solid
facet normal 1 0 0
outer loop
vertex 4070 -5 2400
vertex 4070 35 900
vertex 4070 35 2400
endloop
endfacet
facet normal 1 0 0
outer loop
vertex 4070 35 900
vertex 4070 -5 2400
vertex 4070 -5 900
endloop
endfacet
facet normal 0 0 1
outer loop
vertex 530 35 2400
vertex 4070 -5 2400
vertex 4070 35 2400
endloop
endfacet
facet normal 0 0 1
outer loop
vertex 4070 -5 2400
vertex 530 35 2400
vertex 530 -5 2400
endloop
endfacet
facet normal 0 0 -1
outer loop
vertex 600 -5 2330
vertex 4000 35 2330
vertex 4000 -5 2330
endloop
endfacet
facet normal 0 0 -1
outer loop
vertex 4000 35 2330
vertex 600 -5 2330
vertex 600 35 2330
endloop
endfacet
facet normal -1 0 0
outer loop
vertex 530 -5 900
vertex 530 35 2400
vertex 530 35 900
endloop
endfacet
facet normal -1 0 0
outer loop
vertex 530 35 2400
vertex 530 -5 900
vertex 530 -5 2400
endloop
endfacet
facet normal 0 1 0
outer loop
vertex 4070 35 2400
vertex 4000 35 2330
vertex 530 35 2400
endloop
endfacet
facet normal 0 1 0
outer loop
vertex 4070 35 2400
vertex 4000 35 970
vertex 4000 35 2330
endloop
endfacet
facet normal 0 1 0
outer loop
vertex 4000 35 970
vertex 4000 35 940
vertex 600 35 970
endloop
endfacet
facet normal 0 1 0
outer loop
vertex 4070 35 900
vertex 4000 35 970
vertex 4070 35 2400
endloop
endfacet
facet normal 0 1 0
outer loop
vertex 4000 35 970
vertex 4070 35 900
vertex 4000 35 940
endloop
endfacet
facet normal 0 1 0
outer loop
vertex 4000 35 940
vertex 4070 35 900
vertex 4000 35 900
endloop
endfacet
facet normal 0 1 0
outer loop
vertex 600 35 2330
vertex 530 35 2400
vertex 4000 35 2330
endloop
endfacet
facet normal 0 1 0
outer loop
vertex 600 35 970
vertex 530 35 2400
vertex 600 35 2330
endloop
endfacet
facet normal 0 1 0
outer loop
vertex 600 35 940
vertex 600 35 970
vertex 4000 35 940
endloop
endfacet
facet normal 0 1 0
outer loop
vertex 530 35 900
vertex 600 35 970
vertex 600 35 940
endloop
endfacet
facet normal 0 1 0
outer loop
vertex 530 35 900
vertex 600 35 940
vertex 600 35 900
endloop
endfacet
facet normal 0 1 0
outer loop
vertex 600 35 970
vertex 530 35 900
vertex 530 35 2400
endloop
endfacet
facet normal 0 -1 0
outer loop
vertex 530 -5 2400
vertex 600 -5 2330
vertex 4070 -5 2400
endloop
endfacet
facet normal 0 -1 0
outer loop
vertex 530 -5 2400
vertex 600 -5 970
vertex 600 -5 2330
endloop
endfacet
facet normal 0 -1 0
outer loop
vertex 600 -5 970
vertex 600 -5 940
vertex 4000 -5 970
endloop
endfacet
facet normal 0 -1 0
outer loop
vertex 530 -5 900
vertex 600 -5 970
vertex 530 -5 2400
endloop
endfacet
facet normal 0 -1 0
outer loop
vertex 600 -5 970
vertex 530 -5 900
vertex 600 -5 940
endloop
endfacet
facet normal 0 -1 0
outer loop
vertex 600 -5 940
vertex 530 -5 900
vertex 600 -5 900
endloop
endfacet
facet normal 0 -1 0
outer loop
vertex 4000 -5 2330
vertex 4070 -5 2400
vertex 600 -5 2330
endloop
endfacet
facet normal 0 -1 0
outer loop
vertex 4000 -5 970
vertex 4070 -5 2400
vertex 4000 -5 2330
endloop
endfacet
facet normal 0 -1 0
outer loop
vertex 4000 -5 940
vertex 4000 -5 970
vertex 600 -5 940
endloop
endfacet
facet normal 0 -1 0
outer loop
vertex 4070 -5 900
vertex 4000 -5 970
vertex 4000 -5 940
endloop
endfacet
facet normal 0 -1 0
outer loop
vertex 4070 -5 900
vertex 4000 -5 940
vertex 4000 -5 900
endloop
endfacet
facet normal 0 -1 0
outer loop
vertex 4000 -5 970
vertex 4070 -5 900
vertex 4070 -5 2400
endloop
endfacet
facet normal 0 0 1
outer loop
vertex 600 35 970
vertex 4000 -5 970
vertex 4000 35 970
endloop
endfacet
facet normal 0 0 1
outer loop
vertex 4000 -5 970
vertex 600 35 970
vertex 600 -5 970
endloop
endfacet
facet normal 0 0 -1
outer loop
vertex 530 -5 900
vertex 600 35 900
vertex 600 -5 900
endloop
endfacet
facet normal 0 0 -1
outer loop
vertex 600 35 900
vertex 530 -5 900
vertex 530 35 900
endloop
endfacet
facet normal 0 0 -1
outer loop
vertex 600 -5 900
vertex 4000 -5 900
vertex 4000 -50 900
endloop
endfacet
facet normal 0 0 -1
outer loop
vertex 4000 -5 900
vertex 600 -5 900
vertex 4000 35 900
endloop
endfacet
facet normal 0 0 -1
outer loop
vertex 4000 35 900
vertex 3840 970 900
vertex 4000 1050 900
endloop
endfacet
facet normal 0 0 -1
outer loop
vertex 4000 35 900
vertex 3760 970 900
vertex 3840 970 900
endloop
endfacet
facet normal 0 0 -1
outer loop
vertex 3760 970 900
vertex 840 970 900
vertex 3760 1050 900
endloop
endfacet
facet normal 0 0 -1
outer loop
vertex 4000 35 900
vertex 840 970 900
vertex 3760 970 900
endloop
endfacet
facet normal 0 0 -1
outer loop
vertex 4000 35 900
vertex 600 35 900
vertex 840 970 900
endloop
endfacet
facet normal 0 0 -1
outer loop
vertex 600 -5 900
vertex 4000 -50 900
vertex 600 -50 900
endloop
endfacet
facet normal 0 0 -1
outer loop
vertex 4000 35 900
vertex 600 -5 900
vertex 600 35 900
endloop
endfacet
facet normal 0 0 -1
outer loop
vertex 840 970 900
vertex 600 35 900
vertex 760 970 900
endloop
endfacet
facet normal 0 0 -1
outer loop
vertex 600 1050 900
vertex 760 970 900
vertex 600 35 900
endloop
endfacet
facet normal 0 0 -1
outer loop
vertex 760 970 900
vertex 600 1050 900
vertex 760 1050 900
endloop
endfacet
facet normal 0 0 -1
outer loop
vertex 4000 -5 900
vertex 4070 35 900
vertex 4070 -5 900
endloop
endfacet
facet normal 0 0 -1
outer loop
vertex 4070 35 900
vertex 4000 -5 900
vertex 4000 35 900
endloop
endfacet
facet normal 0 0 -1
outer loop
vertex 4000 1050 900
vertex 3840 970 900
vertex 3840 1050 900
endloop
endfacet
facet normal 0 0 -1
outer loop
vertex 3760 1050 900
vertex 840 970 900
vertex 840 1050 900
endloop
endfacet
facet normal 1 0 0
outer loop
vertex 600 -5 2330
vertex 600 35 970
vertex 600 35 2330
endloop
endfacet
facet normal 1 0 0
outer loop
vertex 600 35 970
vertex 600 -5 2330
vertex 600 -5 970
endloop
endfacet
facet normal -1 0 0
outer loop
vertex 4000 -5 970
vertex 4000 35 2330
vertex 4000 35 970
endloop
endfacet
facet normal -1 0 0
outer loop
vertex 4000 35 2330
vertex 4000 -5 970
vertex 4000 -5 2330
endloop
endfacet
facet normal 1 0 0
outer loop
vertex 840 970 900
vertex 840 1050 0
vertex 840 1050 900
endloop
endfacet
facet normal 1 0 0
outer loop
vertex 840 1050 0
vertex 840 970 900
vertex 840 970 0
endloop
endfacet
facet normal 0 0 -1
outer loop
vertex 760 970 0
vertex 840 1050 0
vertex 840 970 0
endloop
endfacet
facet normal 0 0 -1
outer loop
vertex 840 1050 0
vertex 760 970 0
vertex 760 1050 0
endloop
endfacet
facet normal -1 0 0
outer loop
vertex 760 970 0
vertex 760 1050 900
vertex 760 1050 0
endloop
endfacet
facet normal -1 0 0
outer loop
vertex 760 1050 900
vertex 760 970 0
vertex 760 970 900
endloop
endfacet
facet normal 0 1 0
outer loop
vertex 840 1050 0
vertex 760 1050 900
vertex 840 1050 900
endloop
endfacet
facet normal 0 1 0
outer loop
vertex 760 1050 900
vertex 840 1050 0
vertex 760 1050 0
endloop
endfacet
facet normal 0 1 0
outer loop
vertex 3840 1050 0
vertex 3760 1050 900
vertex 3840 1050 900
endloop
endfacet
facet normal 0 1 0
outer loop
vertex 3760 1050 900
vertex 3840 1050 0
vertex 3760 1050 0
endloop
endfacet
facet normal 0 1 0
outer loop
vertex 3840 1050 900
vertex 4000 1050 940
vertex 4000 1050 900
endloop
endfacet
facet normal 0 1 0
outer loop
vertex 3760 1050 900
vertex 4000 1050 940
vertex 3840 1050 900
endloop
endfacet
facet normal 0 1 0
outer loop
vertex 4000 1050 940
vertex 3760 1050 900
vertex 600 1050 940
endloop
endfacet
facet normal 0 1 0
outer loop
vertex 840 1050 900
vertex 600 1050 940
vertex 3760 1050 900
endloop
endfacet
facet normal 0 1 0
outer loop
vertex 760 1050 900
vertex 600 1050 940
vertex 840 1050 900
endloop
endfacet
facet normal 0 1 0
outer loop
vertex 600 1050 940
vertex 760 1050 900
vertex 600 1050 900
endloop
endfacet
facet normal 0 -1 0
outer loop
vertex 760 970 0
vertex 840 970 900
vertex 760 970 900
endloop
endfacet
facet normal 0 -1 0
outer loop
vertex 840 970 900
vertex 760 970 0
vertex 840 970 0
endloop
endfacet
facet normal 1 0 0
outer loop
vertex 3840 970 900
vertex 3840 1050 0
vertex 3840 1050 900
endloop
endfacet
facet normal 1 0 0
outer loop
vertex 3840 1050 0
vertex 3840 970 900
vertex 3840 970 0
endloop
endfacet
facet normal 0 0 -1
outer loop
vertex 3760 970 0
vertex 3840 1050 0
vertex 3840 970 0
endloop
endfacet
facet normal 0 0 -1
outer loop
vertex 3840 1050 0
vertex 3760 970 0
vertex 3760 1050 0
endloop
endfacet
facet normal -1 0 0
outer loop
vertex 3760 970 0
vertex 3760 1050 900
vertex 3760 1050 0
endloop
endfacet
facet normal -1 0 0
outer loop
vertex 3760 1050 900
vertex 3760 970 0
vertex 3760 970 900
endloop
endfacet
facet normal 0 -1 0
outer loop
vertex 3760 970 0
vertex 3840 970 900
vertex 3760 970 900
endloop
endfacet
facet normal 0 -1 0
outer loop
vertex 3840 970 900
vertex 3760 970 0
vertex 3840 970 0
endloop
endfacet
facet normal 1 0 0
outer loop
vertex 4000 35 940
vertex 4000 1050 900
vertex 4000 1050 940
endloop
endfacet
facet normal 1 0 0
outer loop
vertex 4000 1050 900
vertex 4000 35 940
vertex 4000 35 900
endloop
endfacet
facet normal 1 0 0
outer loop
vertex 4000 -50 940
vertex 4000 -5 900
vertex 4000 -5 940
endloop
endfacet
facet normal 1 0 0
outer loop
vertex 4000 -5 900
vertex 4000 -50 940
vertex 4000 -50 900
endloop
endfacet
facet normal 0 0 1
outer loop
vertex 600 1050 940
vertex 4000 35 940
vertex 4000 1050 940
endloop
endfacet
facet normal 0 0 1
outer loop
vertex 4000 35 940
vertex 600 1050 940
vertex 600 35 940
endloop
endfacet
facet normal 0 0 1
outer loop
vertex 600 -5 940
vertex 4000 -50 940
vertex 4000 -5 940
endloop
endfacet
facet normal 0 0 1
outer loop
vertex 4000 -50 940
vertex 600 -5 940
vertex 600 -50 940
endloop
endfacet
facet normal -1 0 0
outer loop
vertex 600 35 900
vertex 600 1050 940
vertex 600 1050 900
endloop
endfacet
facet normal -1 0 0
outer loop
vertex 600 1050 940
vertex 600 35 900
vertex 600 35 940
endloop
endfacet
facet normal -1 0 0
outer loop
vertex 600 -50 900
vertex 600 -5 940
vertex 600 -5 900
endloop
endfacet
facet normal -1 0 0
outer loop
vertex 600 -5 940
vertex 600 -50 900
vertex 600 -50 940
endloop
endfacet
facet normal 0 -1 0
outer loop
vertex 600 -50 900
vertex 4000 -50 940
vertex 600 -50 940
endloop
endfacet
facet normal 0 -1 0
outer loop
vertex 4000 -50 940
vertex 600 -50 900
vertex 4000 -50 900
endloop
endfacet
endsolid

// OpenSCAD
// part_window_sill_trim.scad — Export the bottom horizontal frame bar as standalone OBJ.
// Press F6 (render), then File -> Export as OBJ.
include <tea_shop_counter_modules.scad>;
window_sill_trim();
